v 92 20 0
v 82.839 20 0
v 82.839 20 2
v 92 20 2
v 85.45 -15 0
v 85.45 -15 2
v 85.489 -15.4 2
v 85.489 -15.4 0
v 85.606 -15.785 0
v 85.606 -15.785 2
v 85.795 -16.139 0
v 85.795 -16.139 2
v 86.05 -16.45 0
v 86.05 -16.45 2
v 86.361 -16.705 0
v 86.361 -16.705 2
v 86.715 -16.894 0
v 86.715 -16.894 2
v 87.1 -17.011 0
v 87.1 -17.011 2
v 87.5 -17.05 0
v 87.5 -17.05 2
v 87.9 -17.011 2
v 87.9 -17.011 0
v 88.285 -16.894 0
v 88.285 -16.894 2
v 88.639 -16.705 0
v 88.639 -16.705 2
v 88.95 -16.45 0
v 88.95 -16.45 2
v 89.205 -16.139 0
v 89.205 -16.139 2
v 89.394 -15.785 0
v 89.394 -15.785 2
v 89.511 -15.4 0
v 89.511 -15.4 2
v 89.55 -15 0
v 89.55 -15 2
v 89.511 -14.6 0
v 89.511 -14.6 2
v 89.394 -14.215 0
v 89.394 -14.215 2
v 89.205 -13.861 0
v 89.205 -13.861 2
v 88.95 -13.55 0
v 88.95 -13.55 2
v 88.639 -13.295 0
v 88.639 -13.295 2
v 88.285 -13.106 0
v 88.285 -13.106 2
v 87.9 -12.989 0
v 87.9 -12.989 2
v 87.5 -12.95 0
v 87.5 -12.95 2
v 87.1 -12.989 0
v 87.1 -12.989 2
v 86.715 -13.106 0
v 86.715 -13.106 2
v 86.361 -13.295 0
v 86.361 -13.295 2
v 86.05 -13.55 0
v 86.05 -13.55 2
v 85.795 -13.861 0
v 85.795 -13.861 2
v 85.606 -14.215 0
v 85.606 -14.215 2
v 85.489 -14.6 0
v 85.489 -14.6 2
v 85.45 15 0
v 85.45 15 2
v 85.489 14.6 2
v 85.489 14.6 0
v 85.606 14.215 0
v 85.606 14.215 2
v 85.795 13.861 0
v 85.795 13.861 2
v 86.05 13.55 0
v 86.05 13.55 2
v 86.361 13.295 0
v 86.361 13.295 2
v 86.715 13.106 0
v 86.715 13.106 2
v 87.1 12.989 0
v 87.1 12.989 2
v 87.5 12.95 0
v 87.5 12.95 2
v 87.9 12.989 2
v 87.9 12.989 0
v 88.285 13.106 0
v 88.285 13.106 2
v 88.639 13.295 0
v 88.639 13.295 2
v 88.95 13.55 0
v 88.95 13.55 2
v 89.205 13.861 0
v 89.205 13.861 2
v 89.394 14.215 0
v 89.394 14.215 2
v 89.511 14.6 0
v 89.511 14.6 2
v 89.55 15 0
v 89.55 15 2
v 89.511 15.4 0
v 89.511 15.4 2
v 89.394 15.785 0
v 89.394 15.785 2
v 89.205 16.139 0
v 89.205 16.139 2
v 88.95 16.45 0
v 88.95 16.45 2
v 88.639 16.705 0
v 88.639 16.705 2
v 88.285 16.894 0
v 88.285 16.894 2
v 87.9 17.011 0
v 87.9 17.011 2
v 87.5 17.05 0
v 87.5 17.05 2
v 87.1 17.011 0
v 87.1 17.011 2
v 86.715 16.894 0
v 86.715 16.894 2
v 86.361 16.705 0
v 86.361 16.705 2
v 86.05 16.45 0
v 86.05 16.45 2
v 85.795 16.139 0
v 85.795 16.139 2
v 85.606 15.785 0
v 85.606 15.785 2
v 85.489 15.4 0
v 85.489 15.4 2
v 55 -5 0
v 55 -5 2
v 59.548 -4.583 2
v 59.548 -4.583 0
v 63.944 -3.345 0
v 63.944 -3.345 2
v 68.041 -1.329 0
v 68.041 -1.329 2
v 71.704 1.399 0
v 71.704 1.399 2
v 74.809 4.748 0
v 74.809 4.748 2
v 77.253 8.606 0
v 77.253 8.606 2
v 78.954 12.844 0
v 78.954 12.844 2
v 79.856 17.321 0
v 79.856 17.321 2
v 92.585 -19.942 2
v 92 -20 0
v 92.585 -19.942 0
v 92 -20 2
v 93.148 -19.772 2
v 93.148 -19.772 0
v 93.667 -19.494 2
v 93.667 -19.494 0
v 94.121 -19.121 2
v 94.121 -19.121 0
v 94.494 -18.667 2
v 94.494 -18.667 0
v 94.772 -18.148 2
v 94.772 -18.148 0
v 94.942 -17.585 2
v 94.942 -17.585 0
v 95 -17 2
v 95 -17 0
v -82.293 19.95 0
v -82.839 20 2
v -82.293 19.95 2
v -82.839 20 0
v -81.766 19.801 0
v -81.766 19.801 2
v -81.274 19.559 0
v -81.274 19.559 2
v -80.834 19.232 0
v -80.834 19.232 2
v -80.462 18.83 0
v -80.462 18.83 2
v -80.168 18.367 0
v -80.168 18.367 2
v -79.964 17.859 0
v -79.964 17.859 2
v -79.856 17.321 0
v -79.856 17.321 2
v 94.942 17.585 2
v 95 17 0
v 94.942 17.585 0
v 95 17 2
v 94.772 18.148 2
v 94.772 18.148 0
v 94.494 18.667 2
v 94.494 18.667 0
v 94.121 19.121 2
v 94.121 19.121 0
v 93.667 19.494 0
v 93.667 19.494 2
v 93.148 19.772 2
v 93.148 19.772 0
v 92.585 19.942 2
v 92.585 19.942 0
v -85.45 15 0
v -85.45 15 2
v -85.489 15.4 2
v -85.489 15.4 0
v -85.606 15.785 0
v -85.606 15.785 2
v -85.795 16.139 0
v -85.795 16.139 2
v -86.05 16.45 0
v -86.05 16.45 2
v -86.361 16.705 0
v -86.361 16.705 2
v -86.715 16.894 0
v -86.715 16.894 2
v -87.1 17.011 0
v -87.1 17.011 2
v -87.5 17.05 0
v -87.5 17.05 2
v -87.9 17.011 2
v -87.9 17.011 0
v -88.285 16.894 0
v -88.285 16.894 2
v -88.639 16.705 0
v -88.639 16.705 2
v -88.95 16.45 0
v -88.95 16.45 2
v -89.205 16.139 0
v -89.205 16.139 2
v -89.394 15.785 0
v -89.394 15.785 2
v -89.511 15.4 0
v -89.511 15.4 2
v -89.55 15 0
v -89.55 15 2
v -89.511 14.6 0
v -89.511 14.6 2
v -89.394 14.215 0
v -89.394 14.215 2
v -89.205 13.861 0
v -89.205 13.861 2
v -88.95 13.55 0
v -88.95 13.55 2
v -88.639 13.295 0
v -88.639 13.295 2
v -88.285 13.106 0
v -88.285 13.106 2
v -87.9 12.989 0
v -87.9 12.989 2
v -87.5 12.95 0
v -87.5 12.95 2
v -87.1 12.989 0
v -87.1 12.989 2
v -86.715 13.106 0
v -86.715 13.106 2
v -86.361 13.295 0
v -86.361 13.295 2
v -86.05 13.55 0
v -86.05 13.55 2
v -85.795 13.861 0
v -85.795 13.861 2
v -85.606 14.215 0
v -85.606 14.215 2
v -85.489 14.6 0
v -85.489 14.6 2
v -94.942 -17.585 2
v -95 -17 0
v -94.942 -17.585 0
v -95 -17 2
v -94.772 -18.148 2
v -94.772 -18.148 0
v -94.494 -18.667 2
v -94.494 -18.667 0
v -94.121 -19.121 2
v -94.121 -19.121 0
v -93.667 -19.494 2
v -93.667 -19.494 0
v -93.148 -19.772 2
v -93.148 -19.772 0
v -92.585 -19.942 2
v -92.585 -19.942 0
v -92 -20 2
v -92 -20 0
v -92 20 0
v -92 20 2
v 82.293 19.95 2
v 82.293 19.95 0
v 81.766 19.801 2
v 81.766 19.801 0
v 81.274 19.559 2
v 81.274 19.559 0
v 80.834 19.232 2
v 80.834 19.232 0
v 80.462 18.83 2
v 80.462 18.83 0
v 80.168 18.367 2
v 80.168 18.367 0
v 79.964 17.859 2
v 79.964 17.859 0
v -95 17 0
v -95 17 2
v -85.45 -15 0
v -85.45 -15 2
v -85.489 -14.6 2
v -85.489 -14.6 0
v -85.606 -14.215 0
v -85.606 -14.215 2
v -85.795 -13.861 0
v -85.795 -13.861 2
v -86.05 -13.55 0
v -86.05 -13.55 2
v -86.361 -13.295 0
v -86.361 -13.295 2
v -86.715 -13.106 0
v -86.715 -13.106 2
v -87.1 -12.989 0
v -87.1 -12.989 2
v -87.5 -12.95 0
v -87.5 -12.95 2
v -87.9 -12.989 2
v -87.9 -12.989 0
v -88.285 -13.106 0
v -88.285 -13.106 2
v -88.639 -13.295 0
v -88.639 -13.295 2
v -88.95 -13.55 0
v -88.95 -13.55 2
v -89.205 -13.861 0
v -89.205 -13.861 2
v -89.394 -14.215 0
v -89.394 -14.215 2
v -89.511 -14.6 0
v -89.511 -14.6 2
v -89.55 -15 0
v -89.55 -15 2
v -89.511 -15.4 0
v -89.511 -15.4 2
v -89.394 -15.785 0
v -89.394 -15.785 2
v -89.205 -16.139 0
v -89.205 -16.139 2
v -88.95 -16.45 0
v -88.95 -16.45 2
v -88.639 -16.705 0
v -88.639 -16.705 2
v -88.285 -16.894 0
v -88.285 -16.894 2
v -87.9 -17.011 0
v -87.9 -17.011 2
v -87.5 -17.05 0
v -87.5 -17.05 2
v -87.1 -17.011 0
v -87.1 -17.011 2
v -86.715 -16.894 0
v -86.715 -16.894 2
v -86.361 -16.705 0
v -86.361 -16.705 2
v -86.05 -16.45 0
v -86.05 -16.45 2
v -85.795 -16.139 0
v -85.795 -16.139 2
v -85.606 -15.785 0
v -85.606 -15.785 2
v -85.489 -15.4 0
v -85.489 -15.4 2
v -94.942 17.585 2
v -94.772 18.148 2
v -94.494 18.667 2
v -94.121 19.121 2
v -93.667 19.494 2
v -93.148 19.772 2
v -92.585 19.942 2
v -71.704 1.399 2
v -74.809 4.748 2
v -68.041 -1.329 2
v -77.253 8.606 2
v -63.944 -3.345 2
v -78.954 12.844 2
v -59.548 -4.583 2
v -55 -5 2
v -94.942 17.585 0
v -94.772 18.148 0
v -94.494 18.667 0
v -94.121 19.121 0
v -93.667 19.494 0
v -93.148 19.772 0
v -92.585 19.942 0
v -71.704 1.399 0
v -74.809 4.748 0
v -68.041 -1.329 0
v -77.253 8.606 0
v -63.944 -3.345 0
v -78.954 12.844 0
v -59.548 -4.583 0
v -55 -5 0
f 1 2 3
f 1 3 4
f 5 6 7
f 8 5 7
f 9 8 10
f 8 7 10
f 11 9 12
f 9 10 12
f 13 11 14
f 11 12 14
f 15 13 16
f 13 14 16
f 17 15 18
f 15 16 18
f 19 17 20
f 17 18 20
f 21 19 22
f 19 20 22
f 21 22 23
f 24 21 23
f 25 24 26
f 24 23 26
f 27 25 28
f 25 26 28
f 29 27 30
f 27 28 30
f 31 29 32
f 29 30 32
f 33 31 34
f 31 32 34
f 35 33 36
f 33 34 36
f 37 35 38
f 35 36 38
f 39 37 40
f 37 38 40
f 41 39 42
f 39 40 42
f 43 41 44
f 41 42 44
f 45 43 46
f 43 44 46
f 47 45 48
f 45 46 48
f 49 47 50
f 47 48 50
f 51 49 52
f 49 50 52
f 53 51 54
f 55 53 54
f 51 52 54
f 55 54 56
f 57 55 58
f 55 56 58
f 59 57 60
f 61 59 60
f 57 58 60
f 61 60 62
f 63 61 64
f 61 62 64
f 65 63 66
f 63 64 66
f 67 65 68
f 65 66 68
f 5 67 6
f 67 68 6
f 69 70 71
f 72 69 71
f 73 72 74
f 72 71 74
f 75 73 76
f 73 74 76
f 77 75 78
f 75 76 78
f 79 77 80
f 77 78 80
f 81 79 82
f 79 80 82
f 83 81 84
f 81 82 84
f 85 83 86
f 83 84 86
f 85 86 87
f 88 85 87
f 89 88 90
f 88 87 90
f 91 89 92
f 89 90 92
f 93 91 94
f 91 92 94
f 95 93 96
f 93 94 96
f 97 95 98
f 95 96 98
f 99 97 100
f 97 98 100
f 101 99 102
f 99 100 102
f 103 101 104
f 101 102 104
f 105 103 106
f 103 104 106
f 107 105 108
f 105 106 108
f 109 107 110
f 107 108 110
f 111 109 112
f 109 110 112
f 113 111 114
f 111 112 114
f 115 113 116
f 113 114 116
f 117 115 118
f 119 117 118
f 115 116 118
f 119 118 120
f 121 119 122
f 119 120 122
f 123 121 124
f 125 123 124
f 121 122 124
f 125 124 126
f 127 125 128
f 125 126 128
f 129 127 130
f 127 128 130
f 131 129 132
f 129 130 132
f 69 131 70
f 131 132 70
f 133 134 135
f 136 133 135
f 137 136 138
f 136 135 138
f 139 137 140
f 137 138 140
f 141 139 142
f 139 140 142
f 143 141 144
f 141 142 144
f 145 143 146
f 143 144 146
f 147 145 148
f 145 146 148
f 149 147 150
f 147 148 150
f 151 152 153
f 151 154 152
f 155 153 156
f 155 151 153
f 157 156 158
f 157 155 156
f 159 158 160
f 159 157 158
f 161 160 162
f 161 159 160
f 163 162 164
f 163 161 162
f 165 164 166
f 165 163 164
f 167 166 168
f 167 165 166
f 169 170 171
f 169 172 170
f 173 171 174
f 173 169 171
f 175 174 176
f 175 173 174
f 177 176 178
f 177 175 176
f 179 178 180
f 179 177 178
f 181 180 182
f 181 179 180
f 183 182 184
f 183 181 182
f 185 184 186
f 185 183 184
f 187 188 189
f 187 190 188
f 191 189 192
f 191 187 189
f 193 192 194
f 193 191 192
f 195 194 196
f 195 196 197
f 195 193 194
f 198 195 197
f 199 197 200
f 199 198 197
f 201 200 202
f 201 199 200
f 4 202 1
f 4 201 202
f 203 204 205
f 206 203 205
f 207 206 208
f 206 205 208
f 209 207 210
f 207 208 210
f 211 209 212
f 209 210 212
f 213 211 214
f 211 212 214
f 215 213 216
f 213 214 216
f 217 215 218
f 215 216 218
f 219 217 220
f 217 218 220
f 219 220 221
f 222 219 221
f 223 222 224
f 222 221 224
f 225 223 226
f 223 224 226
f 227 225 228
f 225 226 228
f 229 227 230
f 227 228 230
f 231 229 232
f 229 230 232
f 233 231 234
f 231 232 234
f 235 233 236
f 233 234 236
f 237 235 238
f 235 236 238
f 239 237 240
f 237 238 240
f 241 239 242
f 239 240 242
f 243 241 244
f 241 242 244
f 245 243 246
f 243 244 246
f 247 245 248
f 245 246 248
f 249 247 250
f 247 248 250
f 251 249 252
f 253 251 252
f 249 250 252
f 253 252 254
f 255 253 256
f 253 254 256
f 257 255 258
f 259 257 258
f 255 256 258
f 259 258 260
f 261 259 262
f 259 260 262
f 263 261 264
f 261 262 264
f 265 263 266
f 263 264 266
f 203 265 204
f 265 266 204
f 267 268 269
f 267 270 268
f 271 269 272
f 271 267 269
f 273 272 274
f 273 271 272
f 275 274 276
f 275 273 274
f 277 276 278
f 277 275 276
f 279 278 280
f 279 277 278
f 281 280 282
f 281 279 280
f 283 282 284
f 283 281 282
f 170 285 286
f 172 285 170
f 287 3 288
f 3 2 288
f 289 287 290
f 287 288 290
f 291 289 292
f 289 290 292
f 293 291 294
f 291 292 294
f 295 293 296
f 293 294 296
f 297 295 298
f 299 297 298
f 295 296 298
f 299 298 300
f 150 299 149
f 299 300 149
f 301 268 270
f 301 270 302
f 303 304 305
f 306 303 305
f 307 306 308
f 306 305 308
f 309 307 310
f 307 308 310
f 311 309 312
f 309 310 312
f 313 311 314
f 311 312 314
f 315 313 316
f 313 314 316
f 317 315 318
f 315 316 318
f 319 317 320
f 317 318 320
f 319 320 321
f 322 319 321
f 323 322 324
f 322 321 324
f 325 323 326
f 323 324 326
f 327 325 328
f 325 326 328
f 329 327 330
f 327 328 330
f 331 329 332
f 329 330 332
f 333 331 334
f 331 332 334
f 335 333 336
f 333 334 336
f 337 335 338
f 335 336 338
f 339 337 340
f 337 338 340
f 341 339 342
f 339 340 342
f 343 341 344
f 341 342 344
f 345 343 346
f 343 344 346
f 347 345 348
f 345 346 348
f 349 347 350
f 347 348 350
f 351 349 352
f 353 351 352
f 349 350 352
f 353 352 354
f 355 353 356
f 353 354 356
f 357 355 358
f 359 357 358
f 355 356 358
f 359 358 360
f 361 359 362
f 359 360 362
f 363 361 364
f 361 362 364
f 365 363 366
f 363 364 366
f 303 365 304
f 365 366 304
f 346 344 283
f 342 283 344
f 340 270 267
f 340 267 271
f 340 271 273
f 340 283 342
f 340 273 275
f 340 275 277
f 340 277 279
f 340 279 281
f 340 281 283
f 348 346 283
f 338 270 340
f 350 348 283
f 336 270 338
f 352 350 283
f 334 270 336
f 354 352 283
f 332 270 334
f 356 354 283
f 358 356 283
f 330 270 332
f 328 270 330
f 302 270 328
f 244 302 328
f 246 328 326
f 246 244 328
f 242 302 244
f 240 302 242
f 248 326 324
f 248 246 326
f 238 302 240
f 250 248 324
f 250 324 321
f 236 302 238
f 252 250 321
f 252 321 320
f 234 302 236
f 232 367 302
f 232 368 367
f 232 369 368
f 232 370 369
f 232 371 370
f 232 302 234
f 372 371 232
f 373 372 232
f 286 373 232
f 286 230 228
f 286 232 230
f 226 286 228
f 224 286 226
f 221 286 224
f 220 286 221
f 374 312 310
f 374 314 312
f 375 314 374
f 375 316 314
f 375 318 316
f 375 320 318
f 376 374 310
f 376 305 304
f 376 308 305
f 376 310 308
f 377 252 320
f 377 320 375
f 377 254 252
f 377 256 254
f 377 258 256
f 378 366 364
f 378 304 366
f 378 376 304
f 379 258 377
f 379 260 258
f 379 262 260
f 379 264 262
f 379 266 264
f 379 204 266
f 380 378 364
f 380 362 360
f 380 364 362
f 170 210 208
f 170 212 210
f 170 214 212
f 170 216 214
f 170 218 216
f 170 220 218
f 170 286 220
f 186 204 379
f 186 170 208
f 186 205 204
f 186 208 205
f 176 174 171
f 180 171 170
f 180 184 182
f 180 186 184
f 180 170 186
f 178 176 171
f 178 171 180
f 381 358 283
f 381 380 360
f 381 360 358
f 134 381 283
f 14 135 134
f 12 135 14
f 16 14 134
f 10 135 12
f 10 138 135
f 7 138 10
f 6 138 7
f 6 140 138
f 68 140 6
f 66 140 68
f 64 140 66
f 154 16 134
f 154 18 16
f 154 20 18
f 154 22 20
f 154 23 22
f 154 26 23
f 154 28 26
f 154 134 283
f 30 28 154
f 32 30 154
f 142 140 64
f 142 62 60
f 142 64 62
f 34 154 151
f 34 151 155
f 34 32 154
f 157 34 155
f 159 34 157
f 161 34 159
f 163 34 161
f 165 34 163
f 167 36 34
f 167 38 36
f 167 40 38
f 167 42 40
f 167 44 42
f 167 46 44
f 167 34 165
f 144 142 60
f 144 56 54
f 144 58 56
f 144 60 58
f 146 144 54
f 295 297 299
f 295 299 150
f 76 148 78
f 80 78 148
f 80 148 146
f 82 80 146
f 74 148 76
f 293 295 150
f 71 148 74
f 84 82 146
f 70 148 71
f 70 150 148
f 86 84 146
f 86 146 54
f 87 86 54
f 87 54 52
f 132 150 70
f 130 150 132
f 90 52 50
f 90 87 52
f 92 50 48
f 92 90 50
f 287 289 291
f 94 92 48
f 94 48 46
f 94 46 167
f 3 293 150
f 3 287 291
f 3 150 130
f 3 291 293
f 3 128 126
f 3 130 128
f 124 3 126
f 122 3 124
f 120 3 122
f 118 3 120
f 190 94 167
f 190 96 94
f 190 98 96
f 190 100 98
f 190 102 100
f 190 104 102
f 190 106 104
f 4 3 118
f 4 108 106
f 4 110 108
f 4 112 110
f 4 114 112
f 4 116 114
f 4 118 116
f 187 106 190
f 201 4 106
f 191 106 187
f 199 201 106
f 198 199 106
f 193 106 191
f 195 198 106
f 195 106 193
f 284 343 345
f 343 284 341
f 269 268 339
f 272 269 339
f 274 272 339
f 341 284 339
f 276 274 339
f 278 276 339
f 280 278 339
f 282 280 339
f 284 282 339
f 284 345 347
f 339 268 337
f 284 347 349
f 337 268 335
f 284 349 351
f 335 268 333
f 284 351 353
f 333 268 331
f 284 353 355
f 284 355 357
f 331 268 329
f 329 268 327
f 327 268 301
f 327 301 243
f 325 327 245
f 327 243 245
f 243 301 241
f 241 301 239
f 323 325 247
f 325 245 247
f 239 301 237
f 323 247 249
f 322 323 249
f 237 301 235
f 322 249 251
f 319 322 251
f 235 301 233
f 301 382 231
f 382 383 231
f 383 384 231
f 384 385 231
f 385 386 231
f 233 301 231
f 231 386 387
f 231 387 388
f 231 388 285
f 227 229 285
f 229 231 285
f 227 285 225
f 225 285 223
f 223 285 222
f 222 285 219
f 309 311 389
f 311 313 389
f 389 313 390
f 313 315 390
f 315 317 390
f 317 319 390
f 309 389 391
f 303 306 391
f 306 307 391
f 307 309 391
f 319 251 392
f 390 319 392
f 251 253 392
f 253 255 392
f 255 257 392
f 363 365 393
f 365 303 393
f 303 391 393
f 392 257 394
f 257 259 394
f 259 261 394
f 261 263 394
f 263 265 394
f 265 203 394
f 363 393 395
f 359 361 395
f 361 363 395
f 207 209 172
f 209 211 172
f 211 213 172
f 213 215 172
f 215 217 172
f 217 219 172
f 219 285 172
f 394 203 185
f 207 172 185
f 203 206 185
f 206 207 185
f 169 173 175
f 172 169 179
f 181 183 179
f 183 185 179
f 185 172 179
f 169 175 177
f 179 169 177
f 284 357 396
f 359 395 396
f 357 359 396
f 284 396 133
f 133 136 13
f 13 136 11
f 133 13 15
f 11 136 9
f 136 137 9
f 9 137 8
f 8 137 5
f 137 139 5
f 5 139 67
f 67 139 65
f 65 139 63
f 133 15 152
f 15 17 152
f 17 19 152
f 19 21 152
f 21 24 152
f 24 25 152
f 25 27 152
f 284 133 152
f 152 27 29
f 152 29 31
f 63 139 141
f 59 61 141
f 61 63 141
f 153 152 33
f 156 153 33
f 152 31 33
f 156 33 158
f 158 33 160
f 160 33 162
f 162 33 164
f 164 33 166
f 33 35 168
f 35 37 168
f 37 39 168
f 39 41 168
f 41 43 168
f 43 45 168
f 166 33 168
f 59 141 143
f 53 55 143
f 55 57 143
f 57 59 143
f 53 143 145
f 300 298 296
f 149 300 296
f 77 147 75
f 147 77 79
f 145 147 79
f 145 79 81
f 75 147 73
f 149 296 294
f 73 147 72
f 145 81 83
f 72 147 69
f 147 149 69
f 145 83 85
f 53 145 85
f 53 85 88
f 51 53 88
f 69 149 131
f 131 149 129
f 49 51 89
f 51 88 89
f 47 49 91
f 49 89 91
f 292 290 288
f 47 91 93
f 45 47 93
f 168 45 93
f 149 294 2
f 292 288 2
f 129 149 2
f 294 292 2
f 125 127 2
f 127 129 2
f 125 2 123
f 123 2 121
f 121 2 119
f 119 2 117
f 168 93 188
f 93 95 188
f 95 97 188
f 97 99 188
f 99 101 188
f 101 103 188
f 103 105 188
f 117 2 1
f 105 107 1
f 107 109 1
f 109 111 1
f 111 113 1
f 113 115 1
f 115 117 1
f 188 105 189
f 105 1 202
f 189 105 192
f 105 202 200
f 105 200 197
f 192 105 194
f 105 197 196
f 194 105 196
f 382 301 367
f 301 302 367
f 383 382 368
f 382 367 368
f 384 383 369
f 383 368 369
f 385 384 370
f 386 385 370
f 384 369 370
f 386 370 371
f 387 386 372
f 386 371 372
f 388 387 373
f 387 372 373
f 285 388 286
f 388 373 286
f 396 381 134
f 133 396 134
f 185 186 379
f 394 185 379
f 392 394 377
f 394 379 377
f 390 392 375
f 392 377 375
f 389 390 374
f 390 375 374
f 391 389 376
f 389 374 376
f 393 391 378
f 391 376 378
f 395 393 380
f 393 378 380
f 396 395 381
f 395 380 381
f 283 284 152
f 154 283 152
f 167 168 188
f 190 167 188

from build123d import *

# Parameters (mm, degrees)
SKETCH_1_W          = 190
SKETCH_1_H          = 40
EXTRUDE_1_DEPTH     = 2
CUT_EXTRUDE_1_DEPTH = 2
SKETCH_3_R          = 2.05
CUT_EXTRUDE_2_DEPTH = 2
FILLET_1_R          = 3


with BuildPart() as part:
    # 草图1 → 凸台-拉伸1 (new body)
    with BuildSketch(Plane.XY):
        Rectangle(SKETCH_1_W, SKETCH_1_H)
    extrude(amount=EXTRUDE_1_DEPTH)

    # 草图2 → 切除-拉伸1 (cut)
    with BuildSketch(Plane.XY.offset(2)):
        with BuildLine():
            Line((0, -5), (0, 20))
            Line((0, 20), (-80, 20))
            ThreePointArc((-80, 20), (-72.67766953, 2.32233047), (-55, -5))
            Line((-55, -5), (0, -5))
        make_face()
        with BuildLine():
            Line((80, 20), (0, 20))
            Line((0, 20), (0, -5))
            Line((0, -5), (55, -5))
            ThreePointArc((55, -5), (72.67766953, 2.32233047), (80, 20))
        make_face()
    extrude(amount=-CUT_EXTRUDE_1_DEPTH, mode=Mode.SUBTRACT)

    # 草图3 → 切除-拉伸2 (cut)
    with BuildSketch(Plane.XY.offset(2)):
        with Locations((-87.5, 15)):
            Circle(SKETCH_3_R)
        with Locations((-87.5, -15)):
            Circle(SKETCH_3_R)
        with Locations(Location((87.5, -15, 0), (0, 0, 180))):
            Circle(SKETCH_3_R)
        with Locations(Location((87.5, 15, 0), (0, 0, 180))):
            Circle(SKETCH_3_R)
    extrude(amount=-CUT_EXTRUDE_2_DEPTH, mode=Mode.SUBTRACT)

    # 圆角1
    fillet_1_edges = [part.edges().sort_by_distance(p)[0] for p in [
        (-80, 20, 1),
        (80, 20, 1),
        (95, -20, 1),
        (-95, -20, 1),
        (-95, 20, 1),
        (95, 20, 1),
    ]]
    fillet(fillet_1_edges, radius=FILLET_1_R)


solid = part.part
